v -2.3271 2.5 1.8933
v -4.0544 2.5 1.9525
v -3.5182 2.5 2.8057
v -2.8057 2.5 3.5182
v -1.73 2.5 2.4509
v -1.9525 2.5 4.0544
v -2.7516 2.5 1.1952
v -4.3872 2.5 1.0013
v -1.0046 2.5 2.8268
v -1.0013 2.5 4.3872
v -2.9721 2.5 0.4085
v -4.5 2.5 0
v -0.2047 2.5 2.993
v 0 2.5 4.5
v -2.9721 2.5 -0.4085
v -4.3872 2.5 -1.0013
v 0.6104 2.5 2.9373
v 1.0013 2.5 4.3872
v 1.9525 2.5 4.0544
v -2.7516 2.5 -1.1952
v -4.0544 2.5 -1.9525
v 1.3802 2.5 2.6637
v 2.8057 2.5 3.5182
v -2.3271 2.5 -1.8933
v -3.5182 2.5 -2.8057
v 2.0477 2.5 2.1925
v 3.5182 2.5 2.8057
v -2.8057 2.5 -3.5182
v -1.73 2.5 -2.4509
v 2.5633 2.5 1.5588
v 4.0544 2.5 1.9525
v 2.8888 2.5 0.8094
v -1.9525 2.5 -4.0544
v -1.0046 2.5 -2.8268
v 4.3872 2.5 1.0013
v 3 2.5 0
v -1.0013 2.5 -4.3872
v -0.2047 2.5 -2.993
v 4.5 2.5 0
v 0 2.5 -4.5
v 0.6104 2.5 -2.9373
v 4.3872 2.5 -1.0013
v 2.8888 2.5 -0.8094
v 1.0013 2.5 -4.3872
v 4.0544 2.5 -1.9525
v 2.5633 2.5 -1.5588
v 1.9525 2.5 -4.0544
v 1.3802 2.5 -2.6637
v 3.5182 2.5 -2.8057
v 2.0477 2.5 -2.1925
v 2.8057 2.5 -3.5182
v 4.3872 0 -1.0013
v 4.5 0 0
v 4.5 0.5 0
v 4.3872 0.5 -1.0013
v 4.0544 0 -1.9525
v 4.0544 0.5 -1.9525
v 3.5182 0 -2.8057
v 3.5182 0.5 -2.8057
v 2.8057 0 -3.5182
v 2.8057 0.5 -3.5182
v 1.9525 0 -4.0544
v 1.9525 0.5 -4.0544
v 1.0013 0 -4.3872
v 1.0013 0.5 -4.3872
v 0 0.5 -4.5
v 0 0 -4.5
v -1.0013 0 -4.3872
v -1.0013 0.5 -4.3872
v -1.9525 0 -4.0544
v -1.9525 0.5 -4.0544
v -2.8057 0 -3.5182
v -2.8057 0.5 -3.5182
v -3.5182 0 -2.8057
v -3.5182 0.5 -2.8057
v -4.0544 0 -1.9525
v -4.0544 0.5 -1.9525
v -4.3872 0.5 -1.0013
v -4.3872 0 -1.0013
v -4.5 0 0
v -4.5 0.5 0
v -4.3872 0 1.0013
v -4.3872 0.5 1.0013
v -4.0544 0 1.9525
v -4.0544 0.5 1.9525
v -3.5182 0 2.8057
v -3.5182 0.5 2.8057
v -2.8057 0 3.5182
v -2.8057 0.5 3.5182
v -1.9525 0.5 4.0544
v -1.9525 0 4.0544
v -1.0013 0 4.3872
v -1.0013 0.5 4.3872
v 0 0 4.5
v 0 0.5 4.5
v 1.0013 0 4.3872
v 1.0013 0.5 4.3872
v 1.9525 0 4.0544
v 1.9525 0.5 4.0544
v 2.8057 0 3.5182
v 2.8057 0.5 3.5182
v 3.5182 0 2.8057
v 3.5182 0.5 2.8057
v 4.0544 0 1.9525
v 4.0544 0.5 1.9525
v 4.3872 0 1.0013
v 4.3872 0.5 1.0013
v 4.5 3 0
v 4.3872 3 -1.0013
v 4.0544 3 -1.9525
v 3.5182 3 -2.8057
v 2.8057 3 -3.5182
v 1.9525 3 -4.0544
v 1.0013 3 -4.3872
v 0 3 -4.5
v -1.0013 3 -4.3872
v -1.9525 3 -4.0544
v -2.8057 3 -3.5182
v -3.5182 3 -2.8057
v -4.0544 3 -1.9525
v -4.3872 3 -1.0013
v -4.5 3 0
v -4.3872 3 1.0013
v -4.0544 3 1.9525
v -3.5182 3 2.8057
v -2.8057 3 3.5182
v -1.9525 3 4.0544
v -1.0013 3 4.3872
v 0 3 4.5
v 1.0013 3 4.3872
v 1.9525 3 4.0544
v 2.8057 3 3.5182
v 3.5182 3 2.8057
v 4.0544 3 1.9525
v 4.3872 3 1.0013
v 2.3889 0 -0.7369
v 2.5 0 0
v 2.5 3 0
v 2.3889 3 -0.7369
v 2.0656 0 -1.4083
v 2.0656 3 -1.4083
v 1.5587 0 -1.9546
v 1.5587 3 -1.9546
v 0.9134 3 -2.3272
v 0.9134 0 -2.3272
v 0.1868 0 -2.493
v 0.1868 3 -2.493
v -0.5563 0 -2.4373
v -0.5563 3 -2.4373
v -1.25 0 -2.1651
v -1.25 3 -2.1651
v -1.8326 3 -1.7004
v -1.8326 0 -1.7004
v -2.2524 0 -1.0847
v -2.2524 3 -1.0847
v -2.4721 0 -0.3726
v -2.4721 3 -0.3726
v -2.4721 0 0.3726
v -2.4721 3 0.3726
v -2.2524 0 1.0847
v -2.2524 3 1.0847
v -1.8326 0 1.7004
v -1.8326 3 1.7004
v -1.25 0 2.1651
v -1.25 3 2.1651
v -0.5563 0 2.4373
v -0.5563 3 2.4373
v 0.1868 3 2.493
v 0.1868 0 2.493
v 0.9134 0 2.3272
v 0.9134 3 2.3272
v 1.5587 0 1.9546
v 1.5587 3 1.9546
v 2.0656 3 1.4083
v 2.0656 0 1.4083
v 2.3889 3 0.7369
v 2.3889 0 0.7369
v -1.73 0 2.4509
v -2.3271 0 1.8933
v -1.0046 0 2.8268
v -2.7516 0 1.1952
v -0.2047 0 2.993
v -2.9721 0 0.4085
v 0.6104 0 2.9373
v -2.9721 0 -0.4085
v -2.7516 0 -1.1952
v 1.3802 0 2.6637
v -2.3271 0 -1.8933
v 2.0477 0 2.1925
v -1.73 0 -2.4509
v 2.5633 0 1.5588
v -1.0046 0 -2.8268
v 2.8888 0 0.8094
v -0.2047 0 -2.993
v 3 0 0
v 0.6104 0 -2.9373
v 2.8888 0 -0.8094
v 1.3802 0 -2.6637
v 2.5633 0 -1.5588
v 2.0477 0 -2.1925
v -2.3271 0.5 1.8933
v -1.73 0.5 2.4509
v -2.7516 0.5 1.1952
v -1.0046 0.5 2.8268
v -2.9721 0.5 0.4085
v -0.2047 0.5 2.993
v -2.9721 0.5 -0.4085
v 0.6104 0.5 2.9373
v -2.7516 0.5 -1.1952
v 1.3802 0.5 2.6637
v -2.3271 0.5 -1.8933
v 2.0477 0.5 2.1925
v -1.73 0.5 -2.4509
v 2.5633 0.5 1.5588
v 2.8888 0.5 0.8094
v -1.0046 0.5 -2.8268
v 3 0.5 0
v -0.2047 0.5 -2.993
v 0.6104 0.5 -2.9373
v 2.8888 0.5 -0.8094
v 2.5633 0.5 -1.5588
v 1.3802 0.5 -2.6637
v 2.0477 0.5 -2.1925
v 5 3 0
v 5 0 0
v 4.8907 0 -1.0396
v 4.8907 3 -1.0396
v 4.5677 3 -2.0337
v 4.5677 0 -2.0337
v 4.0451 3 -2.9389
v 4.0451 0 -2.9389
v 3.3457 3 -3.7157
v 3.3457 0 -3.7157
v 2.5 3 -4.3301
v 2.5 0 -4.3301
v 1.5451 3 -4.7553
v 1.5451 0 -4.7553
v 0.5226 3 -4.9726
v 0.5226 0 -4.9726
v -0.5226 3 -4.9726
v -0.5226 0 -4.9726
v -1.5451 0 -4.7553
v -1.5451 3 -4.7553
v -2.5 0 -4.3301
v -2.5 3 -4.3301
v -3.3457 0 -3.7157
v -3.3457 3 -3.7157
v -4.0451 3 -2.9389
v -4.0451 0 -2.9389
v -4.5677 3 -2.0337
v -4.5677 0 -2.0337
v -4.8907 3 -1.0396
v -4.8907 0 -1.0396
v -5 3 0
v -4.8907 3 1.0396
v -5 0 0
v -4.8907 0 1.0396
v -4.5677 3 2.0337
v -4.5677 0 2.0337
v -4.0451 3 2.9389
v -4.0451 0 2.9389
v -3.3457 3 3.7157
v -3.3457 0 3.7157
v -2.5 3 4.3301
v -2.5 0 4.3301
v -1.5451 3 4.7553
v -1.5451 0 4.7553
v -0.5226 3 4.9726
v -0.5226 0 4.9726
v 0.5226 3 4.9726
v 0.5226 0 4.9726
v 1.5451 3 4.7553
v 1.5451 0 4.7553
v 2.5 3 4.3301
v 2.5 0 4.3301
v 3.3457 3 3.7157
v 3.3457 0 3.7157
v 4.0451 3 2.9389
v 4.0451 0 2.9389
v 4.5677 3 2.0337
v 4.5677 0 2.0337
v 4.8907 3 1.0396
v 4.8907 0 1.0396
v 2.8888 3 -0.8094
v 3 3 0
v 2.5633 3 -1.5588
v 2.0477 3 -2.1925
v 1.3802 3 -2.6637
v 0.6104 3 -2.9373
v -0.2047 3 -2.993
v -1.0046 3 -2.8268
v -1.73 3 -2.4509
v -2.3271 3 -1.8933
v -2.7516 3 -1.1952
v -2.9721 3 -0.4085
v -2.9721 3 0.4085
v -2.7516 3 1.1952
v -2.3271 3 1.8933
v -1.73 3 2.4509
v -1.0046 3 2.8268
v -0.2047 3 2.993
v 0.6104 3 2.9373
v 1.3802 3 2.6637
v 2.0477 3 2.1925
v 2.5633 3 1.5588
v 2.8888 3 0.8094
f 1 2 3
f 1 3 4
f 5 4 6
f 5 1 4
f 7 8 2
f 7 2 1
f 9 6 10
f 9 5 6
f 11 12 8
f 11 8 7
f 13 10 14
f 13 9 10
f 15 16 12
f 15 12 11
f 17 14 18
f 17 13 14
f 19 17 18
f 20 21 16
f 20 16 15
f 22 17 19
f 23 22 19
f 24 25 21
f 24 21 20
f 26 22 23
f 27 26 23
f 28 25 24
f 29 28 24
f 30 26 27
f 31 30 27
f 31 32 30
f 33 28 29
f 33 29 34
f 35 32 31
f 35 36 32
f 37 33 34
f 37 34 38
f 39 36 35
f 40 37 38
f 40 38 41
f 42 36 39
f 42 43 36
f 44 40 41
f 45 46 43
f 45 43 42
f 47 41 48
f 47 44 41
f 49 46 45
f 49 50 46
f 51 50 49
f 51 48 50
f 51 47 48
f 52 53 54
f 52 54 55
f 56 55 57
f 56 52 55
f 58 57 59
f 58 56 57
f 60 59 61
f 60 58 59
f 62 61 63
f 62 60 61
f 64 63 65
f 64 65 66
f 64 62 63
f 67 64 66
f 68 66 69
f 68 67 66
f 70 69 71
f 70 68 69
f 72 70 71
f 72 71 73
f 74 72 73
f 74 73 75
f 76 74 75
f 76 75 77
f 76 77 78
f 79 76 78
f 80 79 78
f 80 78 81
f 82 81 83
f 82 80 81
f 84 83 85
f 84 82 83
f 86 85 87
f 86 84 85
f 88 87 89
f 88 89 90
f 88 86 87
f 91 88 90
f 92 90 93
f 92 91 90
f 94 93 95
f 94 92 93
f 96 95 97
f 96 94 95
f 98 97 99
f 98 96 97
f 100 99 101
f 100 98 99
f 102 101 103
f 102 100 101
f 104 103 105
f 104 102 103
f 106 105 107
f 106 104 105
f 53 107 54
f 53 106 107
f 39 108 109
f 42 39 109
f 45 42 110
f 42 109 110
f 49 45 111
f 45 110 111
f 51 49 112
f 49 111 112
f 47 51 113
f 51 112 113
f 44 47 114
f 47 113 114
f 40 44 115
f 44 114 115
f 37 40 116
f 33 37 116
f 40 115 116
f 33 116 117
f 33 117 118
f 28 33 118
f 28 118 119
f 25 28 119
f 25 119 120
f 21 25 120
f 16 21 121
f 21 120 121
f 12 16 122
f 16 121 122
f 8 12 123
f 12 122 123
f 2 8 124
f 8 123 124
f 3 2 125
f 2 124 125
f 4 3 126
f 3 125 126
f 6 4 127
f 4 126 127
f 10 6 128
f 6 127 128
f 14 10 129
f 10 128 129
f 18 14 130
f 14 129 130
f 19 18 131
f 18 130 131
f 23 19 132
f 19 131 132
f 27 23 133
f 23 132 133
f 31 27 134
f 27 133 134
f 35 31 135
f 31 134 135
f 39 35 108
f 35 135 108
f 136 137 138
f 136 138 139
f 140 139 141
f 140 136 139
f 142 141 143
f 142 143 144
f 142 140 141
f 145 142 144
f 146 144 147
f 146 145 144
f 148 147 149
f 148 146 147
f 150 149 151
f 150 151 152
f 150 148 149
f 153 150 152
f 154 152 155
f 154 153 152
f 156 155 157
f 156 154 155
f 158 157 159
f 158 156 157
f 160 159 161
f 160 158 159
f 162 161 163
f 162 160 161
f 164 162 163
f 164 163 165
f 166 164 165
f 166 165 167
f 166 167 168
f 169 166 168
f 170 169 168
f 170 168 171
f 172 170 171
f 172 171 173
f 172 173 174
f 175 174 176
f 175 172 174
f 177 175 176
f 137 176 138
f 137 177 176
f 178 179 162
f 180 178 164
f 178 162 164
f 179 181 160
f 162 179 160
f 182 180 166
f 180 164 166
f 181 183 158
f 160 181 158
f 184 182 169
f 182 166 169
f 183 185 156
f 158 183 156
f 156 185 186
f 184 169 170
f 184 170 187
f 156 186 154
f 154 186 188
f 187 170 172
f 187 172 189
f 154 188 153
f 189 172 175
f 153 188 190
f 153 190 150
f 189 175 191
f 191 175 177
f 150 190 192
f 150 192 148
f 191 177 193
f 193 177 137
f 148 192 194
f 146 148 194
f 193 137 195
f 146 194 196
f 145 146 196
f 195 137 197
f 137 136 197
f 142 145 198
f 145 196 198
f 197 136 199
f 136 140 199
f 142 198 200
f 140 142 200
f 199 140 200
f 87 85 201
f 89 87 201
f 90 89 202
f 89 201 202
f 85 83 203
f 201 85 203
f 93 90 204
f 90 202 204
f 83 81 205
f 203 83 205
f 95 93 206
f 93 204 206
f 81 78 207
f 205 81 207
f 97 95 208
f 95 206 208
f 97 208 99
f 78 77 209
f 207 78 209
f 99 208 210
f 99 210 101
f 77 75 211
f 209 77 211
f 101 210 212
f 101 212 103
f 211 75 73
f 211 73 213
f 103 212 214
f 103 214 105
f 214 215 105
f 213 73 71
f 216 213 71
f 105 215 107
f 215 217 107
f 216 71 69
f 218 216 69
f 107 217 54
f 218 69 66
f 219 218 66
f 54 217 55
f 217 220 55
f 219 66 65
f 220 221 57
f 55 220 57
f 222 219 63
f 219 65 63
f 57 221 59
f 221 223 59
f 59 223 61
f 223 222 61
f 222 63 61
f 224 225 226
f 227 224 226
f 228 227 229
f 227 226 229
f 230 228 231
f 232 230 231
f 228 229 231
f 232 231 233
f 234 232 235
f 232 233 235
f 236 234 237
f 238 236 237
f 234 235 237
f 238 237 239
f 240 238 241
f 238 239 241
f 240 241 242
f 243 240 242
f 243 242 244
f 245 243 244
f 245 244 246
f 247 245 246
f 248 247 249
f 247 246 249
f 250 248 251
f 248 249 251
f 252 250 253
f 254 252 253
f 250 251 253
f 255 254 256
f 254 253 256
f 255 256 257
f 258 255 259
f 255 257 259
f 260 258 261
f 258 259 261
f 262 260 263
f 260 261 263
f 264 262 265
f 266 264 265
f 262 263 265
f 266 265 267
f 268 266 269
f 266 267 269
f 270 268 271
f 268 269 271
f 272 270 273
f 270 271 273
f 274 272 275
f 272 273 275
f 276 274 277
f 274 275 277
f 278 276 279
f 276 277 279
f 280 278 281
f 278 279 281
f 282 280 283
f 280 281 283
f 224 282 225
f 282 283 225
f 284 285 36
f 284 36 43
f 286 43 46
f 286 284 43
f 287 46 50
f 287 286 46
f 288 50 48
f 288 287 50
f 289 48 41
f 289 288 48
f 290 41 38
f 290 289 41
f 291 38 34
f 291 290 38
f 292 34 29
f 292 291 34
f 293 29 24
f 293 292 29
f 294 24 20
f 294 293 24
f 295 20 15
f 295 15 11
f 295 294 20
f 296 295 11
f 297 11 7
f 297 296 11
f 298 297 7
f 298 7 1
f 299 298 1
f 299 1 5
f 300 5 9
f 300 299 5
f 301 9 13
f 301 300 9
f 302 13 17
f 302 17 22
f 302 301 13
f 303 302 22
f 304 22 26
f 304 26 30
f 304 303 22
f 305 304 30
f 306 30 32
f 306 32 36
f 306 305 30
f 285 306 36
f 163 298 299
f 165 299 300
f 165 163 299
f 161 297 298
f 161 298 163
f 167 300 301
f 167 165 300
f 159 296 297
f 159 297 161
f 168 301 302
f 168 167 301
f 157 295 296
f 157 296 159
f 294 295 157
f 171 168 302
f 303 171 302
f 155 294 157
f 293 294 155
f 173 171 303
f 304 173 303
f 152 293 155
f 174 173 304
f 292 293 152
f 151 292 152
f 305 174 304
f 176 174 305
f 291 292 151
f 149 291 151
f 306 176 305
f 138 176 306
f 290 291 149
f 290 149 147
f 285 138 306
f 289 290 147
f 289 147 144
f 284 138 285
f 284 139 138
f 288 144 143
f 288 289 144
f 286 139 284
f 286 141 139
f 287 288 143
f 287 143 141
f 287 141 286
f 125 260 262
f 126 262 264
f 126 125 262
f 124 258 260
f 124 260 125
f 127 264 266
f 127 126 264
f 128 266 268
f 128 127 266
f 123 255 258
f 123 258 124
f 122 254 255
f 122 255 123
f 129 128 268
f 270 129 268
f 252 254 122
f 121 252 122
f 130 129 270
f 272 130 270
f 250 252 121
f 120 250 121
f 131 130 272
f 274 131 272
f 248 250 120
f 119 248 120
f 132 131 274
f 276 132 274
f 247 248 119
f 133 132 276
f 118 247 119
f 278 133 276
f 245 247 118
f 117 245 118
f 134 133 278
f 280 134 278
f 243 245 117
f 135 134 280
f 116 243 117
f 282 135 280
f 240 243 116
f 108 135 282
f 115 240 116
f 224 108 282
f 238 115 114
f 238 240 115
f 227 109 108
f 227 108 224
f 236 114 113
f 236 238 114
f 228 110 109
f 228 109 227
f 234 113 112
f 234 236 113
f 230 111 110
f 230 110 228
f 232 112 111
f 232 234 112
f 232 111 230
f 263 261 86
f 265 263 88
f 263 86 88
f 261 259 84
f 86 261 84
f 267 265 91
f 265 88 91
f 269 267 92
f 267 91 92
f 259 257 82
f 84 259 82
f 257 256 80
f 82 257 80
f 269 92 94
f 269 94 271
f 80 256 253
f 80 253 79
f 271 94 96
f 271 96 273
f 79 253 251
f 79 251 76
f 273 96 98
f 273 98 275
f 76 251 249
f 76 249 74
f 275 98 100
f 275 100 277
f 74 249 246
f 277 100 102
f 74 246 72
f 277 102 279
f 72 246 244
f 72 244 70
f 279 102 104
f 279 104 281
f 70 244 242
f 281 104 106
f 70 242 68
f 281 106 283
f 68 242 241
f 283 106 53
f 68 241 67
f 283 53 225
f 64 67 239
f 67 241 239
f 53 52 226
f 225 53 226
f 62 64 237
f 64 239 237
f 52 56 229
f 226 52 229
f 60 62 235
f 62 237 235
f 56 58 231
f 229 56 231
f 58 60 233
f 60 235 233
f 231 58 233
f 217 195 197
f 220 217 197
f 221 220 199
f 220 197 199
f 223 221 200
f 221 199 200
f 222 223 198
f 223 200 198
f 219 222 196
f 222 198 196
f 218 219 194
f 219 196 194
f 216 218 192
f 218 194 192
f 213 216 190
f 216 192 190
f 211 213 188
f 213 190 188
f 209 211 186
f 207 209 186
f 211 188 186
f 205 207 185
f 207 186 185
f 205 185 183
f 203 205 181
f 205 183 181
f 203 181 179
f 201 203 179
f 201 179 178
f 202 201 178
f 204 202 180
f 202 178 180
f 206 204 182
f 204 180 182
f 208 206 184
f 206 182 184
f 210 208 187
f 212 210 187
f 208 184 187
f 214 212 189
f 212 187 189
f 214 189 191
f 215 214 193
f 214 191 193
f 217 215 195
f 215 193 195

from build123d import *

# Parameters (mm, degrees)
CROQUIS2_R              = 5
CROQUIS2_R_2            = 2.5
SALIENTE_EXTRUIR1_DEPTH = 3
CROQUIS3_R              = 4.5
CROQUIS3_R_2            = 3
CORTAR_EXTRUIR1_DEPTH   = 0.5


with BuildPart() as part:
    # Croquis2 → Saliente-Extruir1 (new body)
    with BuildSketch(Plane(origin=(0, 0, 0), x_dir=(1, 0, 0), z_dir=(0, 1, 0))):
        Circle(CROQUIS2_R)
        Circle(CROQUIS2_R_2, mode=Mode.SUBTRACT)
    extrude(amount=SALIENTE_EXTRUIR1_DEPTH)

    # Croquis3 → Cortar-Extruir1 (cut)
    with BuildSketch(Plane(origin=(0, 3, 0), x_dir=(1, 0, 0), z_dir=(0, 1, 0))):
        Circle(CROQUIS3_R)
        Circle(CROQUIS3_R_2, mode=Mode.SUBTRACT)
    cortar_extruir1 = extrude(amount=-CORTAR_EXTRUIR1_DEPTH, mode=Mode.SUBTRACT)

    # Simetría1: Cortar-Extruir1 across plane
    add(cortar_extruir1.mirror(Plane.ZX.offset(1.5)), mode=Mode.SUBTRACT)


solid = part.part
